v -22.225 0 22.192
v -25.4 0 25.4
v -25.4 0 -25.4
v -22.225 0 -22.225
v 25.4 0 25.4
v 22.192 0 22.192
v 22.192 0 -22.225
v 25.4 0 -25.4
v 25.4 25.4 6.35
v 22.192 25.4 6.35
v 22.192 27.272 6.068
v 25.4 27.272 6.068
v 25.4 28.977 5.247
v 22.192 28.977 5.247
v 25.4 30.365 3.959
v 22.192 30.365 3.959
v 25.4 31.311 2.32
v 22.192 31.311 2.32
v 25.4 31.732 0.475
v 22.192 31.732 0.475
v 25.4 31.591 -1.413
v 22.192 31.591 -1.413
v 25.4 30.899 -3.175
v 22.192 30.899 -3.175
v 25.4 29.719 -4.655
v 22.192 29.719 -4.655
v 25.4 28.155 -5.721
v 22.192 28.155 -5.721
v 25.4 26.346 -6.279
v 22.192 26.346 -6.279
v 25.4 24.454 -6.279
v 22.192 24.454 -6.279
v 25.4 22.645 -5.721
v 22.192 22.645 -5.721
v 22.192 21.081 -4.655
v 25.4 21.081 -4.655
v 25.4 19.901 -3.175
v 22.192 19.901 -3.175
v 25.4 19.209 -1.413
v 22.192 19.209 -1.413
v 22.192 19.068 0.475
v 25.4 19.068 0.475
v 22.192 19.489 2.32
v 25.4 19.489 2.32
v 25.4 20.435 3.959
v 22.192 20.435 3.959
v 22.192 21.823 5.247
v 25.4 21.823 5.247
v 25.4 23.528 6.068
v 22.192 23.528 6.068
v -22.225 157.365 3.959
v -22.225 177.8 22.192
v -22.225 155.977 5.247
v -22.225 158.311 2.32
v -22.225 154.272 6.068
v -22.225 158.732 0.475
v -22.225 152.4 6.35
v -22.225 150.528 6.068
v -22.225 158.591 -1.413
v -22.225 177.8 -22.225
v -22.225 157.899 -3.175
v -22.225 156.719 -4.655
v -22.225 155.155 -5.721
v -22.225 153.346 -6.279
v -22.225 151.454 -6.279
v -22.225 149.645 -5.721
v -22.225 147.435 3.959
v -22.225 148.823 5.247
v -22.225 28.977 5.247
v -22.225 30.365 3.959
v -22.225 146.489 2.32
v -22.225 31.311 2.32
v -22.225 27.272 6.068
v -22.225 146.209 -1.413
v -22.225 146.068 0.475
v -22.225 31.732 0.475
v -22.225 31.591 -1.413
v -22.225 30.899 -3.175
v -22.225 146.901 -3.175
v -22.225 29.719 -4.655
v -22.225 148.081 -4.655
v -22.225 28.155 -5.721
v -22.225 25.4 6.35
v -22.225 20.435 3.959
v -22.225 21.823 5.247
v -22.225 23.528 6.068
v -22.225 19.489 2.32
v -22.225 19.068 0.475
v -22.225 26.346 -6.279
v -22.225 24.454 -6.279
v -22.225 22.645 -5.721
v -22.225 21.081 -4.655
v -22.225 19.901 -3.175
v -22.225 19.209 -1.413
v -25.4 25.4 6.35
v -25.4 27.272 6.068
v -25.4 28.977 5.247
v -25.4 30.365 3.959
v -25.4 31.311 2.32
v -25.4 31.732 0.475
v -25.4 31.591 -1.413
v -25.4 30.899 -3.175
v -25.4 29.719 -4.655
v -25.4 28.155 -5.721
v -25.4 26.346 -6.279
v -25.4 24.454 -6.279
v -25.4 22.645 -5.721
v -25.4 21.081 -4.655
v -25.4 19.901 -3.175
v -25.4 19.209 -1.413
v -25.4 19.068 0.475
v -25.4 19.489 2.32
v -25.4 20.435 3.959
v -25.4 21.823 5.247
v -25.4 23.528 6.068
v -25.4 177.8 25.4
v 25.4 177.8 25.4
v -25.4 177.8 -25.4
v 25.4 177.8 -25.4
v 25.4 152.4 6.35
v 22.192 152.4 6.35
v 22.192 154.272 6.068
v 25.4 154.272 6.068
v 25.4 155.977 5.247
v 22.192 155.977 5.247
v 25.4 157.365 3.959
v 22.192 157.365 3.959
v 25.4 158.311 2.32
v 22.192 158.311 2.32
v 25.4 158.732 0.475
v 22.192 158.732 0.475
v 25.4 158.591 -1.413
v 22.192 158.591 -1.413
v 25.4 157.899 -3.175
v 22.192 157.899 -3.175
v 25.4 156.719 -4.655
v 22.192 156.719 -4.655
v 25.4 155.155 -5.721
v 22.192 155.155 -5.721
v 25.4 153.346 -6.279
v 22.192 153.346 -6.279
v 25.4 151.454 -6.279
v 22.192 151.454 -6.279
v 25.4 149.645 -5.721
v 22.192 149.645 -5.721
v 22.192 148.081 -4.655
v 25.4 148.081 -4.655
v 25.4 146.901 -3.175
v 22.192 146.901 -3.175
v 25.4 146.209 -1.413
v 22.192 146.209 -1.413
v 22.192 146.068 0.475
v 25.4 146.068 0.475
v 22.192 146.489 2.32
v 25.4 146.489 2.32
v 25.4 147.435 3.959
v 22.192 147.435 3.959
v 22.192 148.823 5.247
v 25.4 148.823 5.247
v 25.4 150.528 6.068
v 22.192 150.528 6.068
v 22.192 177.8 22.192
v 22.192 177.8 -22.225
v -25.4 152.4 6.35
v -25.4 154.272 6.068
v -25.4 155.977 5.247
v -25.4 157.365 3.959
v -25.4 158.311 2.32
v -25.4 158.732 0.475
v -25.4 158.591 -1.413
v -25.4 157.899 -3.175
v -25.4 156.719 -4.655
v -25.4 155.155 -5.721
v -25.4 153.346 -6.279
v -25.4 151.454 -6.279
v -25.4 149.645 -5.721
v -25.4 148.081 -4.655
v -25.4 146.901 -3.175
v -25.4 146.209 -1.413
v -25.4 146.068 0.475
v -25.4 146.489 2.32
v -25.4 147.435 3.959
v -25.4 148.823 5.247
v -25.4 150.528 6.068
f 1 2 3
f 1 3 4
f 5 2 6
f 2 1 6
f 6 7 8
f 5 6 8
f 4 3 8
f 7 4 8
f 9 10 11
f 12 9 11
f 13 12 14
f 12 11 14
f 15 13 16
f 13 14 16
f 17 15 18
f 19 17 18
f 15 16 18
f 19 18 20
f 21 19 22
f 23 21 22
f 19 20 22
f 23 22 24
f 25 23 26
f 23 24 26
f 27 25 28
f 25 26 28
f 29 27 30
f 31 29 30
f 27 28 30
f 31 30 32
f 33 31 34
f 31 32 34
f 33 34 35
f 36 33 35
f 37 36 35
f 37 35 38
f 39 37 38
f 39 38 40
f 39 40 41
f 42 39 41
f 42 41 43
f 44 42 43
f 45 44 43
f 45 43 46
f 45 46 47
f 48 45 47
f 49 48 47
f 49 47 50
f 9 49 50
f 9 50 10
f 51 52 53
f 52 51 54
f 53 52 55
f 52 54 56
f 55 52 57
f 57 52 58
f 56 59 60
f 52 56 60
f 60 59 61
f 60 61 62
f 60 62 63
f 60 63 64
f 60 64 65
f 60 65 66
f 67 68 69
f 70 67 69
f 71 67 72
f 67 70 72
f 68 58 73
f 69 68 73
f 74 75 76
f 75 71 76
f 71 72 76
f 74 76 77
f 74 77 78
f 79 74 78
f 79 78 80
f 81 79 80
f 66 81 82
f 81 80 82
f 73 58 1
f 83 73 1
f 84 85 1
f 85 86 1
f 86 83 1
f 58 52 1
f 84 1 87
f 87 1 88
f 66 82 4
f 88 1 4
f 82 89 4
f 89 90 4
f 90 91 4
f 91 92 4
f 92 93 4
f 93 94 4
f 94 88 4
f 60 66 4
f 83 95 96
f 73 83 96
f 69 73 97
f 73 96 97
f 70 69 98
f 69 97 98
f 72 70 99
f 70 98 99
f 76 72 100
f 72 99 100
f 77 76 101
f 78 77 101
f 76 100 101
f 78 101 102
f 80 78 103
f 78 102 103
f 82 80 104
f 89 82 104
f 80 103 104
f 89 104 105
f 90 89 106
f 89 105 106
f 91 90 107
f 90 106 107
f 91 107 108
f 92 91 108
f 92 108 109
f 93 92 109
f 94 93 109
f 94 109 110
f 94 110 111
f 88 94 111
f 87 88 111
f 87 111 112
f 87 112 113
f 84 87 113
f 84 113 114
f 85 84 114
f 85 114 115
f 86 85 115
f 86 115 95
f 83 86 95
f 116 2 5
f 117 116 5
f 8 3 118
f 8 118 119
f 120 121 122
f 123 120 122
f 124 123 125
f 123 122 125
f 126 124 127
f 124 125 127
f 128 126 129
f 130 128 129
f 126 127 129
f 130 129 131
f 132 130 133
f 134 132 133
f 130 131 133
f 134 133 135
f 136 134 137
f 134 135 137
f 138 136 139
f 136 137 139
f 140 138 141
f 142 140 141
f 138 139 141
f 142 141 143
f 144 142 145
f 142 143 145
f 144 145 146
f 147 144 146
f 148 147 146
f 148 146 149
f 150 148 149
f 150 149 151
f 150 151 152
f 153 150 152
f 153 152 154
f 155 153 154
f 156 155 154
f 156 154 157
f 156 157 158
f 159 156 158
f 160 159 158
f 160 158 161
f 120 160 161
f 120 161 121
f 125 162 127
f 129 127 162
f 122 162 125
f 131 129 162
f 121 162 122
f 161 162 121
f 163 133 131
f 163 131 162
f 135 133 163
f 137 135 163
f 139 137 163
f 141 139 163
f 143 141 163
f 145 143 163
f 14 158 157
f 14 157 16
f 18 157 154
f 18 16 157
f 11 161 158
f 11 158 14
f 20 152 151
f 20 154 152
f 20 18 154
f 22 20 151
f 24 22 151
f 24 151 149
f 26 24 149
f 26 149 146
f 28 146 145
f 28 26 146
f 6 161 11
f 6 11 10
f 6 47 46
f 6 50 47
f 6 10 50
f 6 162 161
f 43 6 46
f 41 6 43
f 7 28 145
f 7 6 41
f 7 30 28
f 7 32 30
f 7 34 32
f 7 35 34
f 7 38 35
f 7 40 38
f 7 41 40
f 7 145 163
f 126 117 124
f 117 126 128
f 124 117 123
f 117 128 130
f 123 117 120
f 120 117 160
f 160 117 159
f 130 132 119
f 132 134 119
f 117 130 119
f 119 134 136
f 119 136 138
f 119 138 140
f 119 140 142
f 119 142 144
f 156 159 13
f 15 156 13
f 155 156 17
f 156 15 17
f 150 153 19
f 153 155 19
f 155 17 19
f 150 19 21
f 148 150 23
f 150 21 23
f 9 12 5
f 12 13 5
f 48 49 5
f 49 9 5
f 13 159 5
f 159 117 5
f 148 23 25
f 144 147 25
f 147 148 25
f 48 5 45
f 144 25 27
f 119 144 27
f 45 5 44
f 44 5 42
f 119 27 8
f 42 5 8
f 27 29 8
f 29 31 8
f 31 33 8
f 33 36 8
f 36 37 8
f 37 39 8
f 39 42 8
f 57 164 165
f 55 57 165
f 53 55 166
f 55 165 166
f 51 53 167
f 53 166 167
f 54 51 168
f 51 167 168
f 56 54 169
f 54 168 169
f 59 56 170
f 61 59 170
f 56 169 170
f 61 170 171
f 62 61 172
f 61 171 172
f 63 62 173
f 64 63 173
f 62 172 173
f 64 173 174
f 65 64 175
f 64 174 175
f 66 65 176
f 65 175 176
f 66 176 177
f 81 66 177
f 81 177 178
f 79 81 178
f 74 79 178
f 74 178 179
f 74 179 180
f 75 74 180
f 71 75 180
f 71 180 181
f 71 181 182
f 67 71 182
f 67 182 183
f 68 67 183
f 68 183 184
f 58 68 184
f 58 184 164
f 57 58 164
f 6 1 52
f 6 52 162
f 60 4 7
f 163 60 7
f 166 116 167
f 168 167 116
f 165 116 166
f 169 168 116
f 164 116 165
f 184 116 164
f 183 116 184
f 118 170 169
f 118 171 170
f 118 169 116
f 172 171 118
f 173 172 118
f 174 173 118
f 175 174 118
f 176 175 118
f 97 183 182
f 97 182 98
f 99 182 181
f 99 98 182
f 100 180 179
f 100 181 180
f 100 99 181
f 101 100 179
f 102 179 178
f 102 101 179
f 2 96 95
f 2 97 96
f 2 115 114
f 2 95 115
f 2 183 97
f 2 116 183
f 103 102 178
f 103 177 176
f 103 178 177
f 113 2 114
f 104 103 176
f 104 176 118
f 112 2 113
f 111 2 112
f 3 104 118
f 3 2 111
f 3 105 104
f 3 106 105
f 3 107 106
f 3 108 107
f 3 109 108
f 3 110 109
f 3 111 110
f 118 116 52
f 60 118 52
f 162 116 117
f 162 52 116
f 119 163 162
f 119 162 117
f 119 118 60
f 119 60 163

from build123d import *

# Parameters (mm, degrees)
SKETCH1_W           = 50.8
SKETCH1_H           = 50.8
SKETCH1_W_2         = 44.416753927
SKETCH1_H_2         = 44.416753927
BOSS_EXTRUDE1_DEPTH = 177.8
SKETCH2_R           = 6.35
CUT_EXTRUDE1_DEPTH  = 51.8


with BuildPart() as part:
    # Sketch1 → Boss-Extrude1 (new body)
    with BuildSketch(Plane(origin=(0, 0, 0), x_dir=(1, 0, 0), z_dir=(0, 1, 0))):
        Rectangle(SKETCH1_W, SKETCH1_H)
        with Locations((-0.016623037, 0.016623037)):
            Rectangle(SKETCH1_W_2, SKETCH1_H_2, mode=Mode.SUBTRACT)
    extrude(amount=BOSS_EXTRUDE1_DEPTH)

    # Sketch2 → Cut-Extrude1 (cut, through all)
    with BuildSketch(Plane.ZY.offset(25.4)):
        with Locations((0, 25.4)):
            Circle(SKETCH2_R)
        with Locations((0, 152.4)):
            Circle(SKETCH2_R)
    extrude(amount=-CUT_EXTRUDE1_DEPTH, mode=Mode.SUBTRACT)


solid = part.part
